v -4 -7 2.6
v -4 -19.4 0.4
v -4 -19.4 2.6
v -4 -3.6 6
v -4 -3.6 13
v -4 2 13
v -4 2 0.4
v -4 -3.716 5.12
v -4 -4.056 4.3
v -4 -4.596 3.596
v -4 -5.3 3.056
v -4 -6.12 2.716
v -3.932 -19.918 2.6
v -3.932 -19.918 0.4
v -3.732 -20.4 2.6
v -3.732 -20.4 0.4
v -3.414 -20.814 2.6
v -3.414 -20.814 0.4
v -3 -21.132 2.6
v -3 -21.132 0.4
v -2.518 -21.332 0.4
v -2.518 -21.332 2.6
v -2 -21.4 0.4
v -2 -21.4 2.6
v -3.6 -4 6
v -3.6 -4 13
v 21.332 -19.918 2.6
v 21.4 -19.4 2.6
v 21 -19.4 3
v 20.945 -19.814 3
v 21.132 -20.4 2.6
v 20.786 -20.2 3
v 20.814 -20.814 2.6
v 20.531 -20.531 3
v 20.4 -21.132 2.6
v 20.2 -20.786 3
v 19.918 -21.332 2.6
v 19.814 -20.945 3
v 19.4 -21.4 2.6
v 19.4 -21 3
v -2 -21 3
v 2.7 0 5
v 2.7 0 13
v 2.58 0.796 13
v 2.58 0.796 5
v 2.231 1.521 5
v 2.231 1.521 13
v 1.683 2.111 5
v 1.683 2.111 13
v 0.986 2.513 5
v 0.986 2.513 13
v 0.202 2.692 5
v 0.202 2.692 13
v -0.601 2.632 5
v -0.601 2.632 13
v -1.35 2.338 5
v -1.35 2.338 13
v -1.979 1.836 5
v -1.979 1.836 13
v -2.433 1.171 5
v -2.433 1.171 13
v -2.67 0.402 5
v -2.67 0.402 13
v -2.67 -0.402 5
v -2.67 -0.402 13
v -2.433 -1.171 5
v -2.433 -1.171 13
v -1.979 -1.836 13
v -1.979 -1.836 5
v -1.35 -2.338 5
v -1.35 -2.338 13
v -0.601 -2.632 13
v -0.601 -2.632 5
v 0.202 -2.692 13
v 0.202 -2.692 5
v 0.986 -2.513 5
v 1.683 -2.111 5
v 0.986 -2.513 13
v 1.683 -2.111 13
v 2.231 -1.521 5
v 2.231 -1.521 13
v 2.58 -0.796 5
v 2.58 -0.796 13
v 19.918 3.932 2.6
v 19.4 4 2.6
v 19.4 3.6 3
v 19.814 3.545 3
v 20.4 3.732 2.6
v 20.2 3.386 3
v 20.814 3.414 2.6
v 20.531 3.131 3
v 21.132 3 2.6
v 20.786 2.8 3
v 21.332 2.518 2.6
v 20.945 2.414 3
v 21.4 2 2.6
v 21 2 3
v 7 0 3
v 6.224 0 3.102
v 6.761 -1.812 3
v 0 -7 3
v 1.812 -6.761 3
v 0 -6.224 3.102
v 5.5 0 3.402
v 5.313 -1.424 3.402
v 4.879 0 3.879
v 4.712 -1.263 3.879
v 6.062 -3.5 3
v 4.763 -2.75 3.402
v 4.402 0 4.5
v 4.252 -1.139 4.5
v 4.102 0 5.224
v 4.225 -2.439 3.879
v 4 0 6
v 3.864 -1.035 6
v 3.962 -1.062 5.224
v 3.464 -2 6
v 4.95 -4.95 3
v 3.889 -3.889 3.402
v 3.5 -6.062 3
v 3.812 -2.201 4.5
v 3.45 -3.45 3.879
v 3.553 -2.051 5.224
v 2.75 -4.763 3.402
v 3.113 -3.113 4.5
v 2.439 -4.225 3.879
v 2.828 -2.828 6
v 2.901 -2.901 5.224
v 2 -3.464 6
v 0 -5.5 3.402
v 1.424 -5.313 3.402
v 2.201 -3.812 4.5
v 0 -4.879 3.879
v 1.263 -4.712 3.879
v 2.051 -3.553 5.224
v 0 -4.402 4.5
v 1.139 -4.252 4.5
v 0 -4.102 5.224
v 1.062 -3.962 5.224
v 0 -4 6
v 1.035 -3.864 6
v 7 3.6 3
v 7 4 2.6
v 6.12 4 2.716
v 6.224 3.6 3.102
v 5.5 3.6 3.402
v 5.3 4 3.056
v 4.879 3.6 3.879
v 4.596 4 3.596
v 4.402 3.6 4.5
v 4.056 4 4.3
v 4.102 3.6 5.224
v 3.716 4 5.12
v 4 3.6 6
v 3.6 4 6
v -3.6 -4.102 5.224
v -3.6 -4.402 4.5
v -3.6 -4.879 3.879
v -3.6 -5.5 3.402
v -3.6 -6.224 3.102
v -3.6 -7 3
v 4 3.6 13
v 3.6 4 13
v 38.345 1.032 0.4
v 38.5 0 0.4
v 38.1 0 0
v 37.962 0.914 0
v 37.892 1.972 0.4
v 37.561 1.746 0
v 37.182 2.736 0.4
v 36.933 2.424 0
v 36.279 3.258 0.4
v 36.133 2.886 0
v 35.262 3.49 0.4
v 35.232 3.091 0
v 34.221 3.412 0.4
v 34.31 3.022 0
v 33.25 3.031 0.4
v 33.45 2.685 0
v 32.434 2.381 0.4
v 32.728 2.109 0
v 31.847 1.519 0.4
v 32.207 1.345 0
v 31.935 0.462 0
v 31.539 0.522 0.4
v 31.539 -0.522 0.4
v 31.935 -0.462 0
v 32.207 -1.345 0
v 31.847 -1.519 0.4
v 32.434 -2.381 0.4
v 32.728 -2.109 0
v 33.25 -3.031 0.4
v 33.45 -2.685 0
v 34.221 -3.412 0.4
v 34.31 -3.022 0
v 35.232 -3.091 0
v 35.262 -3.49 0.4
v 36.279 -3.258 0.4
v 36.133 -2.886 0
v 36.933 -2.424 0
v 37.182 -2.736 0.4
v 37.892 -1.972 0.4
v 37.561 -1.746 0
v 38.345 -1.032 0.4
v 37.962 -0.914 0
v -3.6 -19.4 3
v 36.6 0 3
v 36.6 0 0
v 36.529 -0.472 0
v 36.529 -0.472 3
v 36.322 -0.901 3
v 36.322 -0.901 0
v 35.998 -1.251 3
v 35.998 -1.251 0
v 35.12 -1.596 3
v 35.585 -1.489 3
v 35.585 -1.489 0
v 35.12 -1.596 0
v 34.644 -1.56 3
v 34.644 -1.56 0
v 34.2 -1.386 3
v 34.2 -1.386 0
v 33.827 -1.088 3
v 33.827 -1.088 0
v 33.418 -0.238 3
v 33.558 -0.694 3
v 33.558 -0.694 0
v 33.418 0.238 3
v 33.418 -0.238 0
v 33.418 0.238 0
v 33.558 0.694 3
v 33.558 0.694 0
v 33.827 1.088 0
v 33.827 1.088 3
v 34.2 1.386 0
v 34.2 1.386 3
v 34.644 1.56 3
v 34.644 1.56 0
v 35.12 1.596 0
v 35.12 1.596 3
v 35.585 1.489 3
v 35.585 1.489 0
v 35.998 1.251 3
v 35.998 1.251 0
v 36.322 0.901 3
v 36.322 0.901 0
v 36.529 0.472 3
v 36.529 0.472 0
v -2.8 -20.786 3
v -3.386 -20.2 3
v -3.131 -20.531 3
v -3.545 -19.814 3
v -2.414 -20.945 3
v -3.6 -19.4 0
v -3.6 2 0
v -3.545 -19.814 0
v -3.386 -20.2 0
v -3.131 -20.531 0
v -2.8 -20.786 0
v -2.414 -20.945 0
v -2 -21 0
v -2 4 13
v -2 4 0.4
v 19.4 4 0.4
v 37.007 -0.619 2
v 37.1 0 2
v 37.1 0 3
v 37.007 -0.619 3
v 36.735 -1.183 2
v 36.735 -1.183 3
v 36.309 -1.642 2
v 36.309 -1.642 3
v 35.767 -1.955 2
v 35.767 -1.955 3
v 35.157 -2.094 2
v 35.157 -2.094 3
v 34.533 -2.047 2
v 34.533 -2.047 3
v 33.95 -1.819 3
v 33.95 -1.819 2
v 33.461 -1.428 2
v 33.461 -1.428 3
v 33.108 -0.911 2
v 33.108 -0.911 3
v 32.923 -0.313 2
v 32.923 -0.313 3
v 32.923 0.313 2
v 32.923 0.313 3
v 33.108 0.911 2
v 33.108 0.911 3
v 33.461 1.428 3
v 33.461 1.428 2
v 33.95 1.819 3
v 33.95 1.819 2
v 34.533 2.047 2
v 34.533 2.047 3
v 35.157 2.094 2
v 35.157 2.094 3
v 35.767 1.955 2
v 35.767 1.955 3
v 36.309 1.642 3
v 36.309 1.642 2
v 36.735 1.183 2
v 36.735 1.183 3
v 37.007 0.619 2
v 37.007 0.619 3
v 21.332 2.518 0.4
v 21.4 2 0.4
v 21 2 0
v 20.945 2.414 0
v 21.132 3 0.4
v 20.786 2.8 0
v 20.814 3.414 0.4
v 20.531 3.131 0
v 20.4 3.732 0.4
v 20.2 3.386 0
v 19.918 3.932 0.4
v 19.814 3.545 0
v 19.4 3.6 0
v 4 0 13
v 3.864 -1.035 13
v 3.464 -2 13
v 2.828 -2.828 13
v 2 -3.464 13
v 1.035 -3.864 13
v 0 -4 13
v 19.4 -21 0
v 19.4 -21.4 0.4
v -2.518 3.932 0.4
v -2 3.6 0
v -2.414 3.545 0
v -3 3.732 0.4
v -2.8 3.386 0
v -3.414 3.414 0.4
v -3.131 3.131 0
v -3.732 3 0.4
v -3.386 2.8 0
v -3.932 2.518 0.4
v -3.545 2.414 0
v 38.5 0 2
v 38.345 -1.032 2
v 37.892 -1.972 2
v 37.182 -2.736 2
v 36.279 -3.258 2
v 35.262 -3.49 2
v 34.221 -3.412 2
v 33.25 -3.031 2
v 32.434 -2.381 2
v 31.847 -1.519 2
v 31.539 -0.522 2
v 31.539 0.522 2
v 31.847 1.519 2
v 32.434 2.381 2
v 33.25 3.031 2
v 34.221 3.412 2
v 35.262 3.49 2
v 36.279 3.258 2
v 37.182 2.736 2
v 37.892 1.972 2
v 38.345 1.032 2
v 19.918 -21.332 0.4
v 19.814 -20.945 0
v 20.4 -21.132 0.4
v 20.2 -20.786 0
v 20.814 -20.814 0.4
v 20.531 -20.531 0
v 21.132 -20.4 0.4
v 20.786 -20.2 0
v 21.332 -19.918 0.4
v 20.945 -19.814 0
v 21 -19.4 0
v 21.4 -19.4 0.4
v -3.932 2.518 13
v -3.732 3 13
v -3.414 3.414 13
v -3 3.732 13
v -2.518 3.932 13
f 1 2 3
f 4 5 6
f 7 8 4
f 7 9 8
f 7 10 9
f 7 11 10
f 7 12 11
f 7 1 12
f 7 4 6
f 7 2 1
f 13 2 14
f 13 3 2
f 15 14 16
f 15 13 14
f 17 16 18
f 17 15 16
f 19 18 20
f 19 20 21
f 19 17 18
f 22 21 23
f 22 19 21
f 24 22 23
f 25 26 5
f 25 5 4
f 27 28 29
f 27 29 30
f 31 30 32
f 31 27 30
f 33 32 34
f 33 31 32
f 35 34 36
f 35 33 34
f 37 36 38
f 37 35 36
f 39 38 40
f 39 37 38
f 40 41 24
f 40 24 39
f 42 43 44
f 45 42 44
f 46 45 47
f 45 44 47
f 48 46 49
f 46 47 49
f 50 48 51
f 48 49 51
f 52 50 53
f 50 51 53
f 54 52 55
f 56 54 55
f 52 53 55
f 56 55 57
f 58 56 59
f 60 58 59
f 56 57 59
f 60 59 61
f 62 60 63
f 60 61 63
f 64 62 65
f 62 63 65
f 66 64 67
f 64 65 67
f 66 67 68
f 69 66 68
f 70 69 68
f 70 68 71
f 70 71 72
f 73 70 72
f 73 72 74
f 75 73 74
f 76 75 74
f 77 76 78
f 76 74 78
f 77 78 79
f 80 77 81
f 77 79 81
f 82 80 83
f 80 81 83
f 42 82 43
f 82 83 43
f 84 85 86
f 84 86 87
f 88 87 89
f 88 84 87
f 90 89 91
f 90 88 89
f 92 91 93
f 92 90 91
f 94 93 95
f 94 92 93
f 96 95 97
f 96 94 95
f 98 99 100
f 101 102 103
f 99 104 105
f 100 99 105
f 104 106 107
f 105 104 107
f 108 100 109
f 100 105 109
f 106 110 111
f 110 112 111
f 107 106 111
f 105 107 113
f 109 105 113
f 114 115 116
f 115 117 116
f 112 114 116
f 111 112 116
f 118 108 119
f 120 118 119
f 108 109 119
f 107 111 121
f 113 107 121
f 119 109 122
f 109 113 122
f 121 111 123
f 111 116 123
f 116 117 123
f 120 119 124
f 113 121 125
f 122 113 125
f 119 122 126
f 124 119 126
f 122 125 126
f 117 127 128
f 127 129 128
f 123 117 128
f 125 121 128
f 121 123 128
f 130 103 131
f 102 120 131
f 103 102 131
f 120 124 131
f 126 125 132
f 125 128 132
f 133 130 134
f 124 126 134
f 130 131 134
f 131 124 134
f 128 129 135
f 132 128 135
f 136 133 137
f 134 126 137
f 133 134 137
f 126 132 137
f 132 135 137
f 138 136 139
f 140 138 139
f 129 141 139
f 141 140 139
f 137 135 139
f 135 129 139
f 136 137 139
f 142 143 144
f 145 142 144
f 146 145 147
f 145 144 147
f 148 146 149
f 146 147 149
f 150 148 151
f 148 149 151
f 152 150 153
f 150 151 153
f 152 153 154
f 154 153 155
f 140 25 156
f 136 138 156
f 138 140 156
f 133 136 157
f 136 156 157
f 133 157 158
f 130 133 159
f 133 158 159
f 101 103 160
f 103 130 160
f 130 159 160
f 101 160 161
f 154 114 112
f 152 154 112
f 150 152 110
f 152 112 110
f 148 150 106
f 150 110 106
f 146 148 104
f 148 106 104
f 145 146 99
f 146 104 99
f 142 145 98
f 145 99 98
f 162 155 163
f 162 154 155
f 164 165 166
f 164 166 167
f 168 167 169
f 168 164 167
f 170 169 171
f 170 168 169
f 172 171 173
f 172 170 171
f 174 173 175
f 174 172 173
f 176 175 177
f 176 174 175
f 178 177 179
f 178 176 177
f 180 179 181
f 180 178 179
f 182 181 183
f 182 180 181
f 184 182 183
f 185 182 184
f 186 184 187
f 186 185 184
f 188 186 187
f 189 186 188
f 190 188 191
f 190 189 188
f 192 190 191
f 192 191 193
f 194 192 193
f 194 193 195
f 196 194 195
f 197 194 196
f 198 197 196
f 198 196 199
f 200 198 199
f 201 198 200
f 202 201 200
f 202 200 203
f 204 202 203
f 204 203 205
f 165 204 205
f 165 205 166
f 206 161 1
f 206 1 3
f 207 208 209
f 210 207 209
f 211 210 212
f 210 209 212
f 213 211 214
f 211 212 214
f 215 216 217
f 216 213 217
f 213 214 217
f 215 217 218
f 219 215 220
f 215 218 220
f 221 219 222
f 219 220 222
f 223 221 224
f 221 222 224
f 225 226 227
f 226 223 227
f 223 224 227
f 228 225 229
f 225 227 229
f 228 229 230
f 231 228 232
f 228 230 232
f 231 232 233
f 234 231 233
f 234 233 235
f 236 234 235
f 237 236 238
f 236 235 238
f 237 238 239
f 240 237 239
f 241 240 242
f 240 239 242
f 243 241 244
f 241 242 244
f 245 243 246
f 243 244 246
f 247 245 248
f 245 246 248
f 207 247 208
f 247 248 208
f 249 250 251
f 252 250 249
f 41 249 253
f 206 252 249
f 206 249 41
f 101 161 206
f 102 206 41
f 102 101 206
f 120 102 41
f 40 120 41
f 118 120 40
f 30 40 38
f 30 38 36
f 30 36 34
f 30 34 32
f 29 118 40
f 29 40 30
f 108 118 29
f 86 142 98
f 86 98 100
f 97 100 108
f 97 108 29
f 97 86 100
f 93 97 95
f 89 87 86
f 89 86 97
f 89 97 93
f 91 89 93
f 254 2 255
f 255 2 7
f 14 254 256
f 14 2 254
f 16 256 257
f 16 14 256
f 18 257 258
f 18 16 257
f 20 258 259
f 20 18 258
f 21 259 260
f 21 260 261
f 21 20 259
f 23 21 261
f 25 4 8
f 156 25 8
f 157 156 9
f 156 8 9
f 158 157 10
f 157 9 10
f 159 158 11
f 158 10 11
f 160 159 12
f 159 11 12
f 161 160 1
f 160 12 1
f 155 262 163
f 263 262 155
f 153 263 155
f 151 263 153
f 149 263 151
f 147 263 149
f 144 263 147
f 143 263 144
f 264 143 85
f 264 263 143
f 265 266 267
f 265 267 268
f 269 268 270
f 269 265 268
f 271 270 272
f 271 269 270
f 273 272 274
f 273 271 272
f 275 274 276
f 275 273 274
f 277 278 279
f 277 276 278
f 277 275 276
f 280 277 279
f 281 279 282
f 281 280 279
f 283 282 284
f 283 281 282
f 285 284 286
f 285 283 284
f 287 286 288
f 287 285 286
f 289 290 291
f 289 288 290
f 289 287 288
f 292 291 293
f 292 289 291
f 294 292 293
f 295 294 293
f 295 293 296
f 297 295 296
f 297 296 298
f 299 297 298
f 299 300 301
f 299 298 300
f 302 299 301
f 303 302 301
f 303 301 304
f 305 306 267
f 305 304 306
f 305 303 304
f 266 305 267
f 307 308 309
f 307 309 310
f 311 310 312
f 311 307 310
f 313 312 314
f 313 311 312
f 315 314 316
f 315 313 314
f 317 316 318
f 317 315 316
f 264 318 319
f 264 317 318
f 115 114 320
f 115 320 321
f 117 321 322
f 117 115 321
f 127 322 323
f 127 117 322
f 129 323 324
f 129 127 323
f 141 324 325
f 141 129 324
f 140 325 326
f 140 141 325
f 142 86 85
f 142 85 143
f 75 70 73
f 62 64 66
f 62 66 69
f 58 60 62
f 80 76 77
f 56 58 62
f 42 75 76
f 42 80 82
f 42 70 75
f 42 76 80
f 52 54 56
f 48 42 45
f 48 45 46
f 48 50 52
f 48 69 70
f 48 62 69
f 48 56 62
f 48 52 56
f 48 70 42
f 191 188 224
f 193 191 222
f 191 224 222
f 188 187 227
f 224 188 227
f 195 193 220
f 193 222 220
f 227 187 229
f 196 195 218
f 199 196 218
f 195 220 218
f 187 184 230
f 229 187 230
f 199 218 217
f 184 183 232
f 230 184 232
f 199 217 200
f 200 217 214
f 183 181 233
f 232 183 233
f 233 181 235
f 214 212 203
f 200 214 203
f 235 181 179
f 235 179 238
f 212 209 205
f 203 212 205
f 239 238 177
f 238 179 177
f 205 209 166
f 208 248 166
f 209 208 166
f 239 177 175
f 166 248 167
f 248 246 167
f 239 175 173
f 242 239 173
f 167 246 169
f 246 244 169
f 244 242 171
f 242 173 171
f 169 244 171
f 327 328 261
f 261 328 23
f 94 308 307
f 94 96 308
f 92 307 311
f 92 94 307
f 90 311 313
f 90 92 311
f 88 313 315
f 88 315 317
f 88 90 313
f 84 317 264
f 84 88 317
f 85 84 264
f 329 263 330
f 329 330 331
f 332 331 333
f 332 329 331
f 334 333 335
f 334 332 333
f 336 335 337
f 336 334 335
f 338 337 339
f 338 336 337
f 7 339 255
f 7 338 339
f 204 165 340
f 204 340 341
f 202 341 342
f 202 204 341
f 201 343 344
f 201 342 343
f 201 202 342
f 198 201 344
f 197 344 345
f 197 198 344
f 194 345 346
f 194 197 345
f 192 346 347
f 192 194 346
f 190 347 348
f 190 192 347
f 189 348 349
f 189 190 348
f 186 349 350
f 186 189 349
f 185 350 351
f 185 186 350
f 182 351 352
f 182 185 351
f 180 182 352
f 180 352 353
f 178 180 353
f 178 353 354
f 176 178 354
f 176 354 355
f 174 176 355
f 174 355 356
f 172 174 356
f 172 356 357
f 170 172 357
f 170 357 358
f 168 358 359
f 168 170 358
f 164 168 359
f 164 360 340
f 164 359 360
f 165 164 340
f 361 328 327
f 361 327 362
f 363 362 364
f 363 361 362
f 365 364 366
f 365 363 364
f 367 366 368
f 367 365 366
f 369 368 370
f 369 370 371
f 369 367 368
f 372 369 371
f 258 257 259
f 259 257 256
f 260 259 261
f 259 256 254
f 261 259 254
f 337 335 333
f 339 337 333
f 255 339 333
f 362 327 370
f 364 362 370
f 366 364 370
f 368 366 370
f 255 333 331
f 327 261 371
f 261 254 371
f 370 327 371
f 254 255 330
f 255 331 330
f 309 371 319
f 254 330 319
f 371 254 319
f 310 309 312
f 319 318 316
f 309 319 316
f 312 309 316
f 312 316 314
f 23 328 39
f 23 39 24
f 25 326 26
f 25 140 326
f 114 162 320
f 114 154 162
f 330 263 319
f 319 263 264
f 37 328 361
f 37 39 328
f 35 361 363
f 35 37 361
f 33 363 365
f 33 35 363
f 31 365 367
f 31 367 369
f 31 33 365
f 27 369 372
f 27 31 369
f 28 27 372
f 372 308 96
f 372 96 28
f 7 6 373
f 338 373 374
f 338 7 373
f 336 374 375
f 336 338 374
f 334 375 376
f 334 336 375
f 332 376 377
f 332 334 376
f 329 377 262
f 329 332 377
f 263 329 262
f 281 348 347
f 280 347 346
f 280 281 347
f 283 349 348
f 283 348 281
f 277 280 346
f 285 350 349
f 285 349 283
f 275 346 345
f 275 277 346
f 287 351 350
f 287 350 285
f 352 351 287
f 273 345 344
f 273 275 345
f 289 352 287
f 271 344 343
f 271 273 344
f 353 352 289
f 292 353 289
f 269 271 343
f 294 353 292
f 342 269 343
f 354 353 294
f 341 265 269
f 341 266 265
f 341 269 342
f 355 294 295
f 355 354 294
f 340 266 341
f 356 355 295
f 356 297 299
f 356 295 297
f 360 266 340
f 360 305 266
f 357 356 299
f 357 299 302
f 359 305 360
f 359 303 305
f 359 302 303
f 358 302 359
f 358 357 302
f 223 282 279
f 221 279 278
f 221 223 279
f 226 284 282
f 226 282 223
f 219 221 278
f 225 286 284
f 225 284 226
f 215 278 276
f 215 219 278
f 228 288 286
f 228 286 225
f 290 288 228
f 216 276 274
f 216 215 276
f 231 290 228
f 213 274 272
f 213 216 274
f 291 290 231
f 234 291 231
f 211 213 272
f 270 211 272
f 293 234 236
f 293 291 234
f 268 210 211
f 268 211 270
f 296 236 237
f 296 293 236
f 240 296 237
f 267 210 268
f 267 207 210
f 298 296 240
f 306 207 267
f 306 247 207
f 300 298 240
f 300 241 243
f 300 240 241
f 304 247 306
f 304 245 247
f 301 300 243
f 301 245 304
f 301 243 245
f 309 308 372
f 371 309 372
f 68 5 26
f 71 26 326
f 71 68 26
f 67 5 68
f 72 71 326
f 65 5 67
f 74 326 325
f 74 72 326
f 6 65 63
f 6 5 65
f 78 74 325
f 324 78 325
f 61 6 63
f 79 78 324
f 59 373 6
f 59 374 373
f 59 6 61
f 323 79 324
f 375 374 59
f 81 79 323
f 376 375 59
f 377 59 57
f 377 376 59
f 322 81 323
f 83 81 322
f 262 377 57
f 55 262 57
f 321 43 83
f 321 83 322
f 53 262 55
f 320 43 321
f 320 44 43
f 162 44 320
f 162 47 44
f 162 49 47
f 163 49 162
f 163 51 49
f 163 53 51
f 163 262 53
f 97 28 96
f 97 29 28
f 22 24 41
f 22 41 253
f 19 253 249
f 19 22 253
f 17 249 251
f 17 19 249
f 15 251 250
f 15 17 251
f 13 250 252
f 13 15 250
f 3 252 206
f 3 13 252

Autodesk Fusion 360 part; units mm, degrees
sketch "Sketch1" plane through (0, 0, 0) normal (0, 0, 1) x (1, 0, 0)
  circle A0 centre (0, 0) radius 2.7
  circle A1 centre (0, 0) radius 4
  line L0 (4, -4) -> (-4, -4)
  line L1 (-4, -4) -> (-4, 4)
  line L2 (-4, 4) -> (4, 4)
  line L3 (4, 4) -> (4, -4)
  line L4 (4, -4) -> (-4, 4) construction
  line L5 (-4, -4) -> (4, 4) construction
  circle A2 centre (35, 0) radius 1.6
  circle A3 centre (35, 0) radius 2.1
  circle A4 centre (35, 0) radius 3.5
  line L6 (-4, 4) -> (21.4, 4)
  line L7 (21.4, 4) -> (21.4, -21.4)
  line L8 (21.4, -21.4) -> (-4, -21.4)
  line L9 (-4, -21.4) -> (-4, 4)
  dimension "d3" = 5.4
  dimension "d4" = 8
  dimension "d15" = 3.2
  dimension "d16" = 4.2
  dimension "d17" = 7
  dimension "d25" = 25.4
  dimension "d26" = 25.4
extrude "Extrude1" add sketch "Sketch1" along normal blind 3 contours A0 | A1 | A1 L0 L3 | A1 L2 L3 L6 | L0 L3 L6 L7 L8 L9 | A1 L1 L2 L6 L9 | A1 L0 L1 L9 makes body 1
extrude "Extrude2" add sketch "Sketch1" along normal blind 10 from surface at 3 contours A0 | A1 | A1 L2 L3 L6 | A1 L1 L2 L6 L9 | A1 L0 L1 L9 bodies 1
extrude "Extrude3" cut sketch "Sketch1" against normal blind 8 from surface at 13 contours A0 bodies 1
fillet "Fillet2" radius 2 4 edges at (-4, 4, 6.5) (21.4, 4, 1.5) (21.4, -21.4, 1.5) (-4, -21.4, 1.5) on bodies 1
fillet "Fillet3" radius 3 3 edges at (4, 2, 3) (2.8284, -2.8284, 3) (-2, -4, 3) on bodies 1
chamfer "Chamfer4" distance 0.4 angle 45 8 edges at (20.8142, -20.8142, 0) (8.7, -21.4, 0) (-3.4142, -20.8142, 0) (-4, -8.7, 0) (-3.4142, 3.4142, 0) (8.7, 4, 0) (20.8142, 3.4142, 0) (21.4, -8.7, 0) on bodies 1
chamfer "Chamfer6" distance 0.4 angle 45 11 edges at (4, 4, 9.5) (4.8787, 4, 3.8787) (13.2, 4, 3) (20.8142, 3.4142, 3) (21.4, -8.7, 3) (20.8142, -20.8142, 3) (8.7, -21.4, 3) (-3.4142, -20.8142, 3) (-4, -13.2, 3) (-4, -4.8787, 3.8787) (-4, -4, 9.5) on bodies 1
extrude "Extrude4" add sketch "Sketch1" along normal blind 2 separate body contours A3 | A4 makes body 2
extrude "Extrude5" add sketch "Sketch1" along normal blind 1 from surface at 2 contours A3 bodies 2
chamfer "Chamfer2" distance 0.4 angle 45 1 edges at (31.7369, -1.2657, 0) on bodies 2
